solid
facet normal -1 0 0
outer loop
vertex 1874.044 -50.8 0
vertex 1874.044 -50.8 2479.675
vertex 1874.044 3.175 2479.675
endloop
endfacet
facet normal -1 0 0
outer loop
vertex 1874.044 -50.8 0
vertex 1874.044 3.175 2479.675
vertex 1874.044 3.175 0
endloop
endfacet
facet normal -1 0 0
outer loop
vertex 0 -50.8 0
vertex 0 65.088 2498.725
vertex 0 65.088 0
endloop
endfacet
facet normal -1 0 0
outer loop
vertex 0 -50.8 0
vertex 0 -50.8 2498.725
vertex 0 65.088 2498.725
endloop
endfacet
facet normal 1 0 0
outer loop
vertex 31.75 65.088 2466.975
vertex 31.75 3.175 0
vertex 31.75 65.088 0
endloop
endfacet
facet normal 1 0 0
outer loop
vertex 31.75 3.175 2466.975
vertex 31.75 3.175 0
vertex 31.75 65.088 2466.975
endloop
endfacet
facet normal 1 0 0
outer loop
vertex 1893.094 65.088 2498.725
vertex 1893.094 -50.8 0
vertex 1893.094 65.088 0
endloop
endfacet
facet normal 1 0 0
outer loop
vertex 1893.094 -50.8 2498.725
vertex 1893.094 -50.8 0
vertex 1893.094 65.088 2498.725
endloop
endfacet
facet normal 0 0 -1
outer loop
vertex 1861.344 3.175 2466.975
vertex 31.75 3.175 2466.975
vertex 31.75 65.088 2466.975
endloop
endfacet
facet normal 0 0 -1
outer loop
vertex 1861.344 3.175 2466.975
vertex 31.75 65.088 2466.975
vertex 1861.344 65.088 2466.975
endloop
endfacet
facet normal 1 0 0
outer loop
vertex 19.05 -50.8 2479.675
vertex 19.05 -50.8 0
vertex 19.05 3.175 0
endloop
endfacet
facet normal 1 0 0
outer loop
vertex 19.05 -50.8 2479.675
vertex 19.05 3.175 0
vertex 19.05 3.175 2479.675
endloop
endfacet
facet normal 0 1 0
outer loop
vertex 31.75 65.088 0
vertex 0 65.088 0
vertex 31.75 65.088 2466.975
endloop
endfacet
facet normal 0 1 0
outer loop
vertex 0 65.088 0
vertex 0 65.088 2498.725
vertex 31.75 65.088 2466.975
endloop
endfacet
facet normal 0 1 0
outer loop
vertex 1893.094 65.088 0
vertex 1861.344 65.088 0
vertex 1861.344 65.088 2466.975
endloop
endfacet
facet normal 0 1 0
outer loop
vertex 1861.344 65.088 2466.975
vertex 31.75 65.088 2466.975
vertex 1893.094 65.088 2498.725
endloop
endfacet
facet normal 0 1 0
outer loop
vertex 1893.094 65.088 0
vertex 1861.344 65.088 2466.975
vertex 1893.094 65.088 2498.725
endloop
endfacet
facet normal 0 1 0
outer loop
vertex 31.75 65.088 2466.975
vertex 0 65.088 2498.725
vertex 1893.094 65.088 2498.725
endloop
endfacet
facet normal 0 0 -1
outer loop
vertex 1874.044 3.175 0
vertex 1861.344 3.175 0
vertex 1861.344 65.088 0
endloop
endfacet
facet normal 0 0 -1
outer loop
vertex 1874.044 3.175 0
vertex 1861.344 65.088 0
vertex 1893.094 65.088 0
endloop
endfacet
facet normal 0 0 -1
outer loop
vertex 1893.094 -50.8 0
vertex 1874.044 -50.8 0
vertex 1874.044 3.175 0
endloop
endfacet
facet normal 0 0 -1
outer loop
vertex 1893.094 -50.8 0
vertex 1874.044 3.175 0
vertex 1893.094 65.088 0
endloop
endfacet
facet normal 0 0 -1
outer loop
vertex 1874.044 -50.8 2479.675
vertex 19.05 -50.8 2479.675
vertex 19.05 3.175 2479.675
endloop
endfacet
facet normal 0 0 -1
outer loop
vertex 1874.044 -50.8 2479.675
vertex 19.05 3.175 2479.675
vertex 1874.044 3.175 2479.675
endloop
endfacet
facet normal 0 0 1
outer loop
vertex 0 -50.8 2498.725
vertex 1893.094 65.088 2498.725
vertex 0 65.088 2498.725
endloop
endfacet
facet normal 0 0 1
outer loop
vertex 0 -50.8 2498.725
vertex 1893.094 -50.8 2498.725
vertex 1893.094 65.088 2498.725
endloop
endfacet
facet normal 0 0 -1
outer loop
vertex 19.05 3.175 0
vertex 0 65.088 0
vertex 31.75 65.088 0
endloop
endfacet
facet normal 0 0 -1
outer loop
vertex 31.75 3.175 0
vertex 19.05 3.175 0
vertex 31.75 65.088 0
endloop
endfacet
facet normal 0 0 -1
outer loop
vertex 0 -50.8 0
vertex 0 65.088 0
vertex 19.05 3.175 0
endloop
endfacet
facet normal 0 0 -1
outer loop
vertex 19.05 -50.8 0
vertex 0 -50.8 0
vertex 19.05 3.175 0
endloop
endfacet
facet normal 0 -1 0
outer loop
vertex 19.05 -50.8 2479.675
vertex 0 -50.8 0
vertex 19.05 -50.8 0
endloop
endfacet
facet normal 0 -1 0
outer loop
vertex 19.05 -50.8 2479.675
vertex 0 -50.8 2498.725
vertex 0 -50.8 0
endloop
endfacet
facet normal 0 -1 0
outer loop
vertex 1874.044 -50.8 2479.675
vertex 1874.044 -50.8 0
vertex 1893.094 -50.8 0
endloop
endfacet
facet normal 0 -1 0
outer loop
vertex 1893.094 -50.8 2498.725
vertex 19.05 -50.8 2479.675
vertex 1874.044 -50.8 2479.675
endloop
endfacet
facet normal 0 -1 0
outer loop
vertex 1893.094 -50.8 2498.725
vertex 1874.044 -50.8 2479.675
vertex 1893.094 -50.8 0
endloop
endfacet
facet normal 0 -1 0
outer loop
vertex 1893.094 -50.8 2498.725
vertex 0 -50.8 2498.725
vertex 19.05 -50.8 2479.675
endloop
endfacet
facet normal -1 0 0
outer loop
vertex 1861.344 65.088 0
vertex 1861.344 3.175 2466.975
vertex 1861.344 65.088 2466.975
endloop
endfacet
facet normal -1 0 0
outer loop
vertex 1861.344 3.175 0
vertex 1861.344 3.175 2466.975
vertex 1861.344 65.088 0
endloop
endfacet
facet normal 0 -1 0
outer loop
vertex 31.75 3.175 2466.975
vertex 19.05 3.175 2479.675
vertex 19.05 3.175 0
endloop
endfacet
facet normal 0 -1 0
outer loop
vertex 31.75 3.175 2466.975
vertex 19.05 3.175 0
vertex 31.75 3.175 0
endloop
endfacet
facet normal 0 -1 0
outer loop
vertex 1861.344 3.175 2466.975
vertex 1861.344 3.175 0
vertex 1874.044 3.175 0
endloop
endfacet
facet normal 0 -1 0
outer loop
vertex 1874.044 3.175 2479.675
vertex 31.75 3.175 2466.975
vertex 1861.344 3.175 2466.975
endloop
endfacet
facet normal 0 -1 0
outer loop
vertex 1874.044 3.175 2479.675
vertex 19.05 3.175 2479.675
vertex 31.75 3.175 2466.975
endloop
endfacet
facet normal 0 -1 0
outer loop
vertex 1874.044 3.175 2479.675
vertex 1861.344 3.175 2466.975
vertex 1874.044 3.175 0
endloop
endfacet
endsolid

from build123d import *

# Parameters (mm, degrees)
F3_DEPTH      = 61.9125
F5_DEPTH      = 50.8
F5_DEPTH_BACK = 3.175


with BuildPart() as f3:
    # F2 (on offset) → F3 (new body)
    with BuildSketch(Plane.XZ.offset(-3.175)):
        Polygon((0, 2479.675), (0, 0), (19.05, 0), (31.75, 0), (31.75, 2466.975), (1861.34375, 2466.975), (1861.34375, 0), (1874.04375, 0), (1893.09375, 0), (1893.09375, 2479.675), (1893.09375, 2498.725), (0, 2498.725), align=None)
    extrude(amount=-F3_DEPTH)

    # F4 (on Front) → F5 (join, two sides)
    with BuildSketch(Plane.XZ) as f5_sk:
        Polygon((0, 2479.675), (0, 0), (19.05, 0), (19.05, 2466.975), (19.05, 2479.675), (593.725, 2479.675), (1299.36875, 2479.675), (1874.04375, 2479.675), (1874.04375, 2466.975), (1874.04375, 0), (1893.09375, 0), (1893.09375, 2479.675), (1893.09375, 2498.725), (0, 2498.725), align=None)
    extrude(amount=F5_DEPTH)
    extrude(f5_sk.sketch, amount=-F5_DEPTH_BACK)


solid = f3.part
